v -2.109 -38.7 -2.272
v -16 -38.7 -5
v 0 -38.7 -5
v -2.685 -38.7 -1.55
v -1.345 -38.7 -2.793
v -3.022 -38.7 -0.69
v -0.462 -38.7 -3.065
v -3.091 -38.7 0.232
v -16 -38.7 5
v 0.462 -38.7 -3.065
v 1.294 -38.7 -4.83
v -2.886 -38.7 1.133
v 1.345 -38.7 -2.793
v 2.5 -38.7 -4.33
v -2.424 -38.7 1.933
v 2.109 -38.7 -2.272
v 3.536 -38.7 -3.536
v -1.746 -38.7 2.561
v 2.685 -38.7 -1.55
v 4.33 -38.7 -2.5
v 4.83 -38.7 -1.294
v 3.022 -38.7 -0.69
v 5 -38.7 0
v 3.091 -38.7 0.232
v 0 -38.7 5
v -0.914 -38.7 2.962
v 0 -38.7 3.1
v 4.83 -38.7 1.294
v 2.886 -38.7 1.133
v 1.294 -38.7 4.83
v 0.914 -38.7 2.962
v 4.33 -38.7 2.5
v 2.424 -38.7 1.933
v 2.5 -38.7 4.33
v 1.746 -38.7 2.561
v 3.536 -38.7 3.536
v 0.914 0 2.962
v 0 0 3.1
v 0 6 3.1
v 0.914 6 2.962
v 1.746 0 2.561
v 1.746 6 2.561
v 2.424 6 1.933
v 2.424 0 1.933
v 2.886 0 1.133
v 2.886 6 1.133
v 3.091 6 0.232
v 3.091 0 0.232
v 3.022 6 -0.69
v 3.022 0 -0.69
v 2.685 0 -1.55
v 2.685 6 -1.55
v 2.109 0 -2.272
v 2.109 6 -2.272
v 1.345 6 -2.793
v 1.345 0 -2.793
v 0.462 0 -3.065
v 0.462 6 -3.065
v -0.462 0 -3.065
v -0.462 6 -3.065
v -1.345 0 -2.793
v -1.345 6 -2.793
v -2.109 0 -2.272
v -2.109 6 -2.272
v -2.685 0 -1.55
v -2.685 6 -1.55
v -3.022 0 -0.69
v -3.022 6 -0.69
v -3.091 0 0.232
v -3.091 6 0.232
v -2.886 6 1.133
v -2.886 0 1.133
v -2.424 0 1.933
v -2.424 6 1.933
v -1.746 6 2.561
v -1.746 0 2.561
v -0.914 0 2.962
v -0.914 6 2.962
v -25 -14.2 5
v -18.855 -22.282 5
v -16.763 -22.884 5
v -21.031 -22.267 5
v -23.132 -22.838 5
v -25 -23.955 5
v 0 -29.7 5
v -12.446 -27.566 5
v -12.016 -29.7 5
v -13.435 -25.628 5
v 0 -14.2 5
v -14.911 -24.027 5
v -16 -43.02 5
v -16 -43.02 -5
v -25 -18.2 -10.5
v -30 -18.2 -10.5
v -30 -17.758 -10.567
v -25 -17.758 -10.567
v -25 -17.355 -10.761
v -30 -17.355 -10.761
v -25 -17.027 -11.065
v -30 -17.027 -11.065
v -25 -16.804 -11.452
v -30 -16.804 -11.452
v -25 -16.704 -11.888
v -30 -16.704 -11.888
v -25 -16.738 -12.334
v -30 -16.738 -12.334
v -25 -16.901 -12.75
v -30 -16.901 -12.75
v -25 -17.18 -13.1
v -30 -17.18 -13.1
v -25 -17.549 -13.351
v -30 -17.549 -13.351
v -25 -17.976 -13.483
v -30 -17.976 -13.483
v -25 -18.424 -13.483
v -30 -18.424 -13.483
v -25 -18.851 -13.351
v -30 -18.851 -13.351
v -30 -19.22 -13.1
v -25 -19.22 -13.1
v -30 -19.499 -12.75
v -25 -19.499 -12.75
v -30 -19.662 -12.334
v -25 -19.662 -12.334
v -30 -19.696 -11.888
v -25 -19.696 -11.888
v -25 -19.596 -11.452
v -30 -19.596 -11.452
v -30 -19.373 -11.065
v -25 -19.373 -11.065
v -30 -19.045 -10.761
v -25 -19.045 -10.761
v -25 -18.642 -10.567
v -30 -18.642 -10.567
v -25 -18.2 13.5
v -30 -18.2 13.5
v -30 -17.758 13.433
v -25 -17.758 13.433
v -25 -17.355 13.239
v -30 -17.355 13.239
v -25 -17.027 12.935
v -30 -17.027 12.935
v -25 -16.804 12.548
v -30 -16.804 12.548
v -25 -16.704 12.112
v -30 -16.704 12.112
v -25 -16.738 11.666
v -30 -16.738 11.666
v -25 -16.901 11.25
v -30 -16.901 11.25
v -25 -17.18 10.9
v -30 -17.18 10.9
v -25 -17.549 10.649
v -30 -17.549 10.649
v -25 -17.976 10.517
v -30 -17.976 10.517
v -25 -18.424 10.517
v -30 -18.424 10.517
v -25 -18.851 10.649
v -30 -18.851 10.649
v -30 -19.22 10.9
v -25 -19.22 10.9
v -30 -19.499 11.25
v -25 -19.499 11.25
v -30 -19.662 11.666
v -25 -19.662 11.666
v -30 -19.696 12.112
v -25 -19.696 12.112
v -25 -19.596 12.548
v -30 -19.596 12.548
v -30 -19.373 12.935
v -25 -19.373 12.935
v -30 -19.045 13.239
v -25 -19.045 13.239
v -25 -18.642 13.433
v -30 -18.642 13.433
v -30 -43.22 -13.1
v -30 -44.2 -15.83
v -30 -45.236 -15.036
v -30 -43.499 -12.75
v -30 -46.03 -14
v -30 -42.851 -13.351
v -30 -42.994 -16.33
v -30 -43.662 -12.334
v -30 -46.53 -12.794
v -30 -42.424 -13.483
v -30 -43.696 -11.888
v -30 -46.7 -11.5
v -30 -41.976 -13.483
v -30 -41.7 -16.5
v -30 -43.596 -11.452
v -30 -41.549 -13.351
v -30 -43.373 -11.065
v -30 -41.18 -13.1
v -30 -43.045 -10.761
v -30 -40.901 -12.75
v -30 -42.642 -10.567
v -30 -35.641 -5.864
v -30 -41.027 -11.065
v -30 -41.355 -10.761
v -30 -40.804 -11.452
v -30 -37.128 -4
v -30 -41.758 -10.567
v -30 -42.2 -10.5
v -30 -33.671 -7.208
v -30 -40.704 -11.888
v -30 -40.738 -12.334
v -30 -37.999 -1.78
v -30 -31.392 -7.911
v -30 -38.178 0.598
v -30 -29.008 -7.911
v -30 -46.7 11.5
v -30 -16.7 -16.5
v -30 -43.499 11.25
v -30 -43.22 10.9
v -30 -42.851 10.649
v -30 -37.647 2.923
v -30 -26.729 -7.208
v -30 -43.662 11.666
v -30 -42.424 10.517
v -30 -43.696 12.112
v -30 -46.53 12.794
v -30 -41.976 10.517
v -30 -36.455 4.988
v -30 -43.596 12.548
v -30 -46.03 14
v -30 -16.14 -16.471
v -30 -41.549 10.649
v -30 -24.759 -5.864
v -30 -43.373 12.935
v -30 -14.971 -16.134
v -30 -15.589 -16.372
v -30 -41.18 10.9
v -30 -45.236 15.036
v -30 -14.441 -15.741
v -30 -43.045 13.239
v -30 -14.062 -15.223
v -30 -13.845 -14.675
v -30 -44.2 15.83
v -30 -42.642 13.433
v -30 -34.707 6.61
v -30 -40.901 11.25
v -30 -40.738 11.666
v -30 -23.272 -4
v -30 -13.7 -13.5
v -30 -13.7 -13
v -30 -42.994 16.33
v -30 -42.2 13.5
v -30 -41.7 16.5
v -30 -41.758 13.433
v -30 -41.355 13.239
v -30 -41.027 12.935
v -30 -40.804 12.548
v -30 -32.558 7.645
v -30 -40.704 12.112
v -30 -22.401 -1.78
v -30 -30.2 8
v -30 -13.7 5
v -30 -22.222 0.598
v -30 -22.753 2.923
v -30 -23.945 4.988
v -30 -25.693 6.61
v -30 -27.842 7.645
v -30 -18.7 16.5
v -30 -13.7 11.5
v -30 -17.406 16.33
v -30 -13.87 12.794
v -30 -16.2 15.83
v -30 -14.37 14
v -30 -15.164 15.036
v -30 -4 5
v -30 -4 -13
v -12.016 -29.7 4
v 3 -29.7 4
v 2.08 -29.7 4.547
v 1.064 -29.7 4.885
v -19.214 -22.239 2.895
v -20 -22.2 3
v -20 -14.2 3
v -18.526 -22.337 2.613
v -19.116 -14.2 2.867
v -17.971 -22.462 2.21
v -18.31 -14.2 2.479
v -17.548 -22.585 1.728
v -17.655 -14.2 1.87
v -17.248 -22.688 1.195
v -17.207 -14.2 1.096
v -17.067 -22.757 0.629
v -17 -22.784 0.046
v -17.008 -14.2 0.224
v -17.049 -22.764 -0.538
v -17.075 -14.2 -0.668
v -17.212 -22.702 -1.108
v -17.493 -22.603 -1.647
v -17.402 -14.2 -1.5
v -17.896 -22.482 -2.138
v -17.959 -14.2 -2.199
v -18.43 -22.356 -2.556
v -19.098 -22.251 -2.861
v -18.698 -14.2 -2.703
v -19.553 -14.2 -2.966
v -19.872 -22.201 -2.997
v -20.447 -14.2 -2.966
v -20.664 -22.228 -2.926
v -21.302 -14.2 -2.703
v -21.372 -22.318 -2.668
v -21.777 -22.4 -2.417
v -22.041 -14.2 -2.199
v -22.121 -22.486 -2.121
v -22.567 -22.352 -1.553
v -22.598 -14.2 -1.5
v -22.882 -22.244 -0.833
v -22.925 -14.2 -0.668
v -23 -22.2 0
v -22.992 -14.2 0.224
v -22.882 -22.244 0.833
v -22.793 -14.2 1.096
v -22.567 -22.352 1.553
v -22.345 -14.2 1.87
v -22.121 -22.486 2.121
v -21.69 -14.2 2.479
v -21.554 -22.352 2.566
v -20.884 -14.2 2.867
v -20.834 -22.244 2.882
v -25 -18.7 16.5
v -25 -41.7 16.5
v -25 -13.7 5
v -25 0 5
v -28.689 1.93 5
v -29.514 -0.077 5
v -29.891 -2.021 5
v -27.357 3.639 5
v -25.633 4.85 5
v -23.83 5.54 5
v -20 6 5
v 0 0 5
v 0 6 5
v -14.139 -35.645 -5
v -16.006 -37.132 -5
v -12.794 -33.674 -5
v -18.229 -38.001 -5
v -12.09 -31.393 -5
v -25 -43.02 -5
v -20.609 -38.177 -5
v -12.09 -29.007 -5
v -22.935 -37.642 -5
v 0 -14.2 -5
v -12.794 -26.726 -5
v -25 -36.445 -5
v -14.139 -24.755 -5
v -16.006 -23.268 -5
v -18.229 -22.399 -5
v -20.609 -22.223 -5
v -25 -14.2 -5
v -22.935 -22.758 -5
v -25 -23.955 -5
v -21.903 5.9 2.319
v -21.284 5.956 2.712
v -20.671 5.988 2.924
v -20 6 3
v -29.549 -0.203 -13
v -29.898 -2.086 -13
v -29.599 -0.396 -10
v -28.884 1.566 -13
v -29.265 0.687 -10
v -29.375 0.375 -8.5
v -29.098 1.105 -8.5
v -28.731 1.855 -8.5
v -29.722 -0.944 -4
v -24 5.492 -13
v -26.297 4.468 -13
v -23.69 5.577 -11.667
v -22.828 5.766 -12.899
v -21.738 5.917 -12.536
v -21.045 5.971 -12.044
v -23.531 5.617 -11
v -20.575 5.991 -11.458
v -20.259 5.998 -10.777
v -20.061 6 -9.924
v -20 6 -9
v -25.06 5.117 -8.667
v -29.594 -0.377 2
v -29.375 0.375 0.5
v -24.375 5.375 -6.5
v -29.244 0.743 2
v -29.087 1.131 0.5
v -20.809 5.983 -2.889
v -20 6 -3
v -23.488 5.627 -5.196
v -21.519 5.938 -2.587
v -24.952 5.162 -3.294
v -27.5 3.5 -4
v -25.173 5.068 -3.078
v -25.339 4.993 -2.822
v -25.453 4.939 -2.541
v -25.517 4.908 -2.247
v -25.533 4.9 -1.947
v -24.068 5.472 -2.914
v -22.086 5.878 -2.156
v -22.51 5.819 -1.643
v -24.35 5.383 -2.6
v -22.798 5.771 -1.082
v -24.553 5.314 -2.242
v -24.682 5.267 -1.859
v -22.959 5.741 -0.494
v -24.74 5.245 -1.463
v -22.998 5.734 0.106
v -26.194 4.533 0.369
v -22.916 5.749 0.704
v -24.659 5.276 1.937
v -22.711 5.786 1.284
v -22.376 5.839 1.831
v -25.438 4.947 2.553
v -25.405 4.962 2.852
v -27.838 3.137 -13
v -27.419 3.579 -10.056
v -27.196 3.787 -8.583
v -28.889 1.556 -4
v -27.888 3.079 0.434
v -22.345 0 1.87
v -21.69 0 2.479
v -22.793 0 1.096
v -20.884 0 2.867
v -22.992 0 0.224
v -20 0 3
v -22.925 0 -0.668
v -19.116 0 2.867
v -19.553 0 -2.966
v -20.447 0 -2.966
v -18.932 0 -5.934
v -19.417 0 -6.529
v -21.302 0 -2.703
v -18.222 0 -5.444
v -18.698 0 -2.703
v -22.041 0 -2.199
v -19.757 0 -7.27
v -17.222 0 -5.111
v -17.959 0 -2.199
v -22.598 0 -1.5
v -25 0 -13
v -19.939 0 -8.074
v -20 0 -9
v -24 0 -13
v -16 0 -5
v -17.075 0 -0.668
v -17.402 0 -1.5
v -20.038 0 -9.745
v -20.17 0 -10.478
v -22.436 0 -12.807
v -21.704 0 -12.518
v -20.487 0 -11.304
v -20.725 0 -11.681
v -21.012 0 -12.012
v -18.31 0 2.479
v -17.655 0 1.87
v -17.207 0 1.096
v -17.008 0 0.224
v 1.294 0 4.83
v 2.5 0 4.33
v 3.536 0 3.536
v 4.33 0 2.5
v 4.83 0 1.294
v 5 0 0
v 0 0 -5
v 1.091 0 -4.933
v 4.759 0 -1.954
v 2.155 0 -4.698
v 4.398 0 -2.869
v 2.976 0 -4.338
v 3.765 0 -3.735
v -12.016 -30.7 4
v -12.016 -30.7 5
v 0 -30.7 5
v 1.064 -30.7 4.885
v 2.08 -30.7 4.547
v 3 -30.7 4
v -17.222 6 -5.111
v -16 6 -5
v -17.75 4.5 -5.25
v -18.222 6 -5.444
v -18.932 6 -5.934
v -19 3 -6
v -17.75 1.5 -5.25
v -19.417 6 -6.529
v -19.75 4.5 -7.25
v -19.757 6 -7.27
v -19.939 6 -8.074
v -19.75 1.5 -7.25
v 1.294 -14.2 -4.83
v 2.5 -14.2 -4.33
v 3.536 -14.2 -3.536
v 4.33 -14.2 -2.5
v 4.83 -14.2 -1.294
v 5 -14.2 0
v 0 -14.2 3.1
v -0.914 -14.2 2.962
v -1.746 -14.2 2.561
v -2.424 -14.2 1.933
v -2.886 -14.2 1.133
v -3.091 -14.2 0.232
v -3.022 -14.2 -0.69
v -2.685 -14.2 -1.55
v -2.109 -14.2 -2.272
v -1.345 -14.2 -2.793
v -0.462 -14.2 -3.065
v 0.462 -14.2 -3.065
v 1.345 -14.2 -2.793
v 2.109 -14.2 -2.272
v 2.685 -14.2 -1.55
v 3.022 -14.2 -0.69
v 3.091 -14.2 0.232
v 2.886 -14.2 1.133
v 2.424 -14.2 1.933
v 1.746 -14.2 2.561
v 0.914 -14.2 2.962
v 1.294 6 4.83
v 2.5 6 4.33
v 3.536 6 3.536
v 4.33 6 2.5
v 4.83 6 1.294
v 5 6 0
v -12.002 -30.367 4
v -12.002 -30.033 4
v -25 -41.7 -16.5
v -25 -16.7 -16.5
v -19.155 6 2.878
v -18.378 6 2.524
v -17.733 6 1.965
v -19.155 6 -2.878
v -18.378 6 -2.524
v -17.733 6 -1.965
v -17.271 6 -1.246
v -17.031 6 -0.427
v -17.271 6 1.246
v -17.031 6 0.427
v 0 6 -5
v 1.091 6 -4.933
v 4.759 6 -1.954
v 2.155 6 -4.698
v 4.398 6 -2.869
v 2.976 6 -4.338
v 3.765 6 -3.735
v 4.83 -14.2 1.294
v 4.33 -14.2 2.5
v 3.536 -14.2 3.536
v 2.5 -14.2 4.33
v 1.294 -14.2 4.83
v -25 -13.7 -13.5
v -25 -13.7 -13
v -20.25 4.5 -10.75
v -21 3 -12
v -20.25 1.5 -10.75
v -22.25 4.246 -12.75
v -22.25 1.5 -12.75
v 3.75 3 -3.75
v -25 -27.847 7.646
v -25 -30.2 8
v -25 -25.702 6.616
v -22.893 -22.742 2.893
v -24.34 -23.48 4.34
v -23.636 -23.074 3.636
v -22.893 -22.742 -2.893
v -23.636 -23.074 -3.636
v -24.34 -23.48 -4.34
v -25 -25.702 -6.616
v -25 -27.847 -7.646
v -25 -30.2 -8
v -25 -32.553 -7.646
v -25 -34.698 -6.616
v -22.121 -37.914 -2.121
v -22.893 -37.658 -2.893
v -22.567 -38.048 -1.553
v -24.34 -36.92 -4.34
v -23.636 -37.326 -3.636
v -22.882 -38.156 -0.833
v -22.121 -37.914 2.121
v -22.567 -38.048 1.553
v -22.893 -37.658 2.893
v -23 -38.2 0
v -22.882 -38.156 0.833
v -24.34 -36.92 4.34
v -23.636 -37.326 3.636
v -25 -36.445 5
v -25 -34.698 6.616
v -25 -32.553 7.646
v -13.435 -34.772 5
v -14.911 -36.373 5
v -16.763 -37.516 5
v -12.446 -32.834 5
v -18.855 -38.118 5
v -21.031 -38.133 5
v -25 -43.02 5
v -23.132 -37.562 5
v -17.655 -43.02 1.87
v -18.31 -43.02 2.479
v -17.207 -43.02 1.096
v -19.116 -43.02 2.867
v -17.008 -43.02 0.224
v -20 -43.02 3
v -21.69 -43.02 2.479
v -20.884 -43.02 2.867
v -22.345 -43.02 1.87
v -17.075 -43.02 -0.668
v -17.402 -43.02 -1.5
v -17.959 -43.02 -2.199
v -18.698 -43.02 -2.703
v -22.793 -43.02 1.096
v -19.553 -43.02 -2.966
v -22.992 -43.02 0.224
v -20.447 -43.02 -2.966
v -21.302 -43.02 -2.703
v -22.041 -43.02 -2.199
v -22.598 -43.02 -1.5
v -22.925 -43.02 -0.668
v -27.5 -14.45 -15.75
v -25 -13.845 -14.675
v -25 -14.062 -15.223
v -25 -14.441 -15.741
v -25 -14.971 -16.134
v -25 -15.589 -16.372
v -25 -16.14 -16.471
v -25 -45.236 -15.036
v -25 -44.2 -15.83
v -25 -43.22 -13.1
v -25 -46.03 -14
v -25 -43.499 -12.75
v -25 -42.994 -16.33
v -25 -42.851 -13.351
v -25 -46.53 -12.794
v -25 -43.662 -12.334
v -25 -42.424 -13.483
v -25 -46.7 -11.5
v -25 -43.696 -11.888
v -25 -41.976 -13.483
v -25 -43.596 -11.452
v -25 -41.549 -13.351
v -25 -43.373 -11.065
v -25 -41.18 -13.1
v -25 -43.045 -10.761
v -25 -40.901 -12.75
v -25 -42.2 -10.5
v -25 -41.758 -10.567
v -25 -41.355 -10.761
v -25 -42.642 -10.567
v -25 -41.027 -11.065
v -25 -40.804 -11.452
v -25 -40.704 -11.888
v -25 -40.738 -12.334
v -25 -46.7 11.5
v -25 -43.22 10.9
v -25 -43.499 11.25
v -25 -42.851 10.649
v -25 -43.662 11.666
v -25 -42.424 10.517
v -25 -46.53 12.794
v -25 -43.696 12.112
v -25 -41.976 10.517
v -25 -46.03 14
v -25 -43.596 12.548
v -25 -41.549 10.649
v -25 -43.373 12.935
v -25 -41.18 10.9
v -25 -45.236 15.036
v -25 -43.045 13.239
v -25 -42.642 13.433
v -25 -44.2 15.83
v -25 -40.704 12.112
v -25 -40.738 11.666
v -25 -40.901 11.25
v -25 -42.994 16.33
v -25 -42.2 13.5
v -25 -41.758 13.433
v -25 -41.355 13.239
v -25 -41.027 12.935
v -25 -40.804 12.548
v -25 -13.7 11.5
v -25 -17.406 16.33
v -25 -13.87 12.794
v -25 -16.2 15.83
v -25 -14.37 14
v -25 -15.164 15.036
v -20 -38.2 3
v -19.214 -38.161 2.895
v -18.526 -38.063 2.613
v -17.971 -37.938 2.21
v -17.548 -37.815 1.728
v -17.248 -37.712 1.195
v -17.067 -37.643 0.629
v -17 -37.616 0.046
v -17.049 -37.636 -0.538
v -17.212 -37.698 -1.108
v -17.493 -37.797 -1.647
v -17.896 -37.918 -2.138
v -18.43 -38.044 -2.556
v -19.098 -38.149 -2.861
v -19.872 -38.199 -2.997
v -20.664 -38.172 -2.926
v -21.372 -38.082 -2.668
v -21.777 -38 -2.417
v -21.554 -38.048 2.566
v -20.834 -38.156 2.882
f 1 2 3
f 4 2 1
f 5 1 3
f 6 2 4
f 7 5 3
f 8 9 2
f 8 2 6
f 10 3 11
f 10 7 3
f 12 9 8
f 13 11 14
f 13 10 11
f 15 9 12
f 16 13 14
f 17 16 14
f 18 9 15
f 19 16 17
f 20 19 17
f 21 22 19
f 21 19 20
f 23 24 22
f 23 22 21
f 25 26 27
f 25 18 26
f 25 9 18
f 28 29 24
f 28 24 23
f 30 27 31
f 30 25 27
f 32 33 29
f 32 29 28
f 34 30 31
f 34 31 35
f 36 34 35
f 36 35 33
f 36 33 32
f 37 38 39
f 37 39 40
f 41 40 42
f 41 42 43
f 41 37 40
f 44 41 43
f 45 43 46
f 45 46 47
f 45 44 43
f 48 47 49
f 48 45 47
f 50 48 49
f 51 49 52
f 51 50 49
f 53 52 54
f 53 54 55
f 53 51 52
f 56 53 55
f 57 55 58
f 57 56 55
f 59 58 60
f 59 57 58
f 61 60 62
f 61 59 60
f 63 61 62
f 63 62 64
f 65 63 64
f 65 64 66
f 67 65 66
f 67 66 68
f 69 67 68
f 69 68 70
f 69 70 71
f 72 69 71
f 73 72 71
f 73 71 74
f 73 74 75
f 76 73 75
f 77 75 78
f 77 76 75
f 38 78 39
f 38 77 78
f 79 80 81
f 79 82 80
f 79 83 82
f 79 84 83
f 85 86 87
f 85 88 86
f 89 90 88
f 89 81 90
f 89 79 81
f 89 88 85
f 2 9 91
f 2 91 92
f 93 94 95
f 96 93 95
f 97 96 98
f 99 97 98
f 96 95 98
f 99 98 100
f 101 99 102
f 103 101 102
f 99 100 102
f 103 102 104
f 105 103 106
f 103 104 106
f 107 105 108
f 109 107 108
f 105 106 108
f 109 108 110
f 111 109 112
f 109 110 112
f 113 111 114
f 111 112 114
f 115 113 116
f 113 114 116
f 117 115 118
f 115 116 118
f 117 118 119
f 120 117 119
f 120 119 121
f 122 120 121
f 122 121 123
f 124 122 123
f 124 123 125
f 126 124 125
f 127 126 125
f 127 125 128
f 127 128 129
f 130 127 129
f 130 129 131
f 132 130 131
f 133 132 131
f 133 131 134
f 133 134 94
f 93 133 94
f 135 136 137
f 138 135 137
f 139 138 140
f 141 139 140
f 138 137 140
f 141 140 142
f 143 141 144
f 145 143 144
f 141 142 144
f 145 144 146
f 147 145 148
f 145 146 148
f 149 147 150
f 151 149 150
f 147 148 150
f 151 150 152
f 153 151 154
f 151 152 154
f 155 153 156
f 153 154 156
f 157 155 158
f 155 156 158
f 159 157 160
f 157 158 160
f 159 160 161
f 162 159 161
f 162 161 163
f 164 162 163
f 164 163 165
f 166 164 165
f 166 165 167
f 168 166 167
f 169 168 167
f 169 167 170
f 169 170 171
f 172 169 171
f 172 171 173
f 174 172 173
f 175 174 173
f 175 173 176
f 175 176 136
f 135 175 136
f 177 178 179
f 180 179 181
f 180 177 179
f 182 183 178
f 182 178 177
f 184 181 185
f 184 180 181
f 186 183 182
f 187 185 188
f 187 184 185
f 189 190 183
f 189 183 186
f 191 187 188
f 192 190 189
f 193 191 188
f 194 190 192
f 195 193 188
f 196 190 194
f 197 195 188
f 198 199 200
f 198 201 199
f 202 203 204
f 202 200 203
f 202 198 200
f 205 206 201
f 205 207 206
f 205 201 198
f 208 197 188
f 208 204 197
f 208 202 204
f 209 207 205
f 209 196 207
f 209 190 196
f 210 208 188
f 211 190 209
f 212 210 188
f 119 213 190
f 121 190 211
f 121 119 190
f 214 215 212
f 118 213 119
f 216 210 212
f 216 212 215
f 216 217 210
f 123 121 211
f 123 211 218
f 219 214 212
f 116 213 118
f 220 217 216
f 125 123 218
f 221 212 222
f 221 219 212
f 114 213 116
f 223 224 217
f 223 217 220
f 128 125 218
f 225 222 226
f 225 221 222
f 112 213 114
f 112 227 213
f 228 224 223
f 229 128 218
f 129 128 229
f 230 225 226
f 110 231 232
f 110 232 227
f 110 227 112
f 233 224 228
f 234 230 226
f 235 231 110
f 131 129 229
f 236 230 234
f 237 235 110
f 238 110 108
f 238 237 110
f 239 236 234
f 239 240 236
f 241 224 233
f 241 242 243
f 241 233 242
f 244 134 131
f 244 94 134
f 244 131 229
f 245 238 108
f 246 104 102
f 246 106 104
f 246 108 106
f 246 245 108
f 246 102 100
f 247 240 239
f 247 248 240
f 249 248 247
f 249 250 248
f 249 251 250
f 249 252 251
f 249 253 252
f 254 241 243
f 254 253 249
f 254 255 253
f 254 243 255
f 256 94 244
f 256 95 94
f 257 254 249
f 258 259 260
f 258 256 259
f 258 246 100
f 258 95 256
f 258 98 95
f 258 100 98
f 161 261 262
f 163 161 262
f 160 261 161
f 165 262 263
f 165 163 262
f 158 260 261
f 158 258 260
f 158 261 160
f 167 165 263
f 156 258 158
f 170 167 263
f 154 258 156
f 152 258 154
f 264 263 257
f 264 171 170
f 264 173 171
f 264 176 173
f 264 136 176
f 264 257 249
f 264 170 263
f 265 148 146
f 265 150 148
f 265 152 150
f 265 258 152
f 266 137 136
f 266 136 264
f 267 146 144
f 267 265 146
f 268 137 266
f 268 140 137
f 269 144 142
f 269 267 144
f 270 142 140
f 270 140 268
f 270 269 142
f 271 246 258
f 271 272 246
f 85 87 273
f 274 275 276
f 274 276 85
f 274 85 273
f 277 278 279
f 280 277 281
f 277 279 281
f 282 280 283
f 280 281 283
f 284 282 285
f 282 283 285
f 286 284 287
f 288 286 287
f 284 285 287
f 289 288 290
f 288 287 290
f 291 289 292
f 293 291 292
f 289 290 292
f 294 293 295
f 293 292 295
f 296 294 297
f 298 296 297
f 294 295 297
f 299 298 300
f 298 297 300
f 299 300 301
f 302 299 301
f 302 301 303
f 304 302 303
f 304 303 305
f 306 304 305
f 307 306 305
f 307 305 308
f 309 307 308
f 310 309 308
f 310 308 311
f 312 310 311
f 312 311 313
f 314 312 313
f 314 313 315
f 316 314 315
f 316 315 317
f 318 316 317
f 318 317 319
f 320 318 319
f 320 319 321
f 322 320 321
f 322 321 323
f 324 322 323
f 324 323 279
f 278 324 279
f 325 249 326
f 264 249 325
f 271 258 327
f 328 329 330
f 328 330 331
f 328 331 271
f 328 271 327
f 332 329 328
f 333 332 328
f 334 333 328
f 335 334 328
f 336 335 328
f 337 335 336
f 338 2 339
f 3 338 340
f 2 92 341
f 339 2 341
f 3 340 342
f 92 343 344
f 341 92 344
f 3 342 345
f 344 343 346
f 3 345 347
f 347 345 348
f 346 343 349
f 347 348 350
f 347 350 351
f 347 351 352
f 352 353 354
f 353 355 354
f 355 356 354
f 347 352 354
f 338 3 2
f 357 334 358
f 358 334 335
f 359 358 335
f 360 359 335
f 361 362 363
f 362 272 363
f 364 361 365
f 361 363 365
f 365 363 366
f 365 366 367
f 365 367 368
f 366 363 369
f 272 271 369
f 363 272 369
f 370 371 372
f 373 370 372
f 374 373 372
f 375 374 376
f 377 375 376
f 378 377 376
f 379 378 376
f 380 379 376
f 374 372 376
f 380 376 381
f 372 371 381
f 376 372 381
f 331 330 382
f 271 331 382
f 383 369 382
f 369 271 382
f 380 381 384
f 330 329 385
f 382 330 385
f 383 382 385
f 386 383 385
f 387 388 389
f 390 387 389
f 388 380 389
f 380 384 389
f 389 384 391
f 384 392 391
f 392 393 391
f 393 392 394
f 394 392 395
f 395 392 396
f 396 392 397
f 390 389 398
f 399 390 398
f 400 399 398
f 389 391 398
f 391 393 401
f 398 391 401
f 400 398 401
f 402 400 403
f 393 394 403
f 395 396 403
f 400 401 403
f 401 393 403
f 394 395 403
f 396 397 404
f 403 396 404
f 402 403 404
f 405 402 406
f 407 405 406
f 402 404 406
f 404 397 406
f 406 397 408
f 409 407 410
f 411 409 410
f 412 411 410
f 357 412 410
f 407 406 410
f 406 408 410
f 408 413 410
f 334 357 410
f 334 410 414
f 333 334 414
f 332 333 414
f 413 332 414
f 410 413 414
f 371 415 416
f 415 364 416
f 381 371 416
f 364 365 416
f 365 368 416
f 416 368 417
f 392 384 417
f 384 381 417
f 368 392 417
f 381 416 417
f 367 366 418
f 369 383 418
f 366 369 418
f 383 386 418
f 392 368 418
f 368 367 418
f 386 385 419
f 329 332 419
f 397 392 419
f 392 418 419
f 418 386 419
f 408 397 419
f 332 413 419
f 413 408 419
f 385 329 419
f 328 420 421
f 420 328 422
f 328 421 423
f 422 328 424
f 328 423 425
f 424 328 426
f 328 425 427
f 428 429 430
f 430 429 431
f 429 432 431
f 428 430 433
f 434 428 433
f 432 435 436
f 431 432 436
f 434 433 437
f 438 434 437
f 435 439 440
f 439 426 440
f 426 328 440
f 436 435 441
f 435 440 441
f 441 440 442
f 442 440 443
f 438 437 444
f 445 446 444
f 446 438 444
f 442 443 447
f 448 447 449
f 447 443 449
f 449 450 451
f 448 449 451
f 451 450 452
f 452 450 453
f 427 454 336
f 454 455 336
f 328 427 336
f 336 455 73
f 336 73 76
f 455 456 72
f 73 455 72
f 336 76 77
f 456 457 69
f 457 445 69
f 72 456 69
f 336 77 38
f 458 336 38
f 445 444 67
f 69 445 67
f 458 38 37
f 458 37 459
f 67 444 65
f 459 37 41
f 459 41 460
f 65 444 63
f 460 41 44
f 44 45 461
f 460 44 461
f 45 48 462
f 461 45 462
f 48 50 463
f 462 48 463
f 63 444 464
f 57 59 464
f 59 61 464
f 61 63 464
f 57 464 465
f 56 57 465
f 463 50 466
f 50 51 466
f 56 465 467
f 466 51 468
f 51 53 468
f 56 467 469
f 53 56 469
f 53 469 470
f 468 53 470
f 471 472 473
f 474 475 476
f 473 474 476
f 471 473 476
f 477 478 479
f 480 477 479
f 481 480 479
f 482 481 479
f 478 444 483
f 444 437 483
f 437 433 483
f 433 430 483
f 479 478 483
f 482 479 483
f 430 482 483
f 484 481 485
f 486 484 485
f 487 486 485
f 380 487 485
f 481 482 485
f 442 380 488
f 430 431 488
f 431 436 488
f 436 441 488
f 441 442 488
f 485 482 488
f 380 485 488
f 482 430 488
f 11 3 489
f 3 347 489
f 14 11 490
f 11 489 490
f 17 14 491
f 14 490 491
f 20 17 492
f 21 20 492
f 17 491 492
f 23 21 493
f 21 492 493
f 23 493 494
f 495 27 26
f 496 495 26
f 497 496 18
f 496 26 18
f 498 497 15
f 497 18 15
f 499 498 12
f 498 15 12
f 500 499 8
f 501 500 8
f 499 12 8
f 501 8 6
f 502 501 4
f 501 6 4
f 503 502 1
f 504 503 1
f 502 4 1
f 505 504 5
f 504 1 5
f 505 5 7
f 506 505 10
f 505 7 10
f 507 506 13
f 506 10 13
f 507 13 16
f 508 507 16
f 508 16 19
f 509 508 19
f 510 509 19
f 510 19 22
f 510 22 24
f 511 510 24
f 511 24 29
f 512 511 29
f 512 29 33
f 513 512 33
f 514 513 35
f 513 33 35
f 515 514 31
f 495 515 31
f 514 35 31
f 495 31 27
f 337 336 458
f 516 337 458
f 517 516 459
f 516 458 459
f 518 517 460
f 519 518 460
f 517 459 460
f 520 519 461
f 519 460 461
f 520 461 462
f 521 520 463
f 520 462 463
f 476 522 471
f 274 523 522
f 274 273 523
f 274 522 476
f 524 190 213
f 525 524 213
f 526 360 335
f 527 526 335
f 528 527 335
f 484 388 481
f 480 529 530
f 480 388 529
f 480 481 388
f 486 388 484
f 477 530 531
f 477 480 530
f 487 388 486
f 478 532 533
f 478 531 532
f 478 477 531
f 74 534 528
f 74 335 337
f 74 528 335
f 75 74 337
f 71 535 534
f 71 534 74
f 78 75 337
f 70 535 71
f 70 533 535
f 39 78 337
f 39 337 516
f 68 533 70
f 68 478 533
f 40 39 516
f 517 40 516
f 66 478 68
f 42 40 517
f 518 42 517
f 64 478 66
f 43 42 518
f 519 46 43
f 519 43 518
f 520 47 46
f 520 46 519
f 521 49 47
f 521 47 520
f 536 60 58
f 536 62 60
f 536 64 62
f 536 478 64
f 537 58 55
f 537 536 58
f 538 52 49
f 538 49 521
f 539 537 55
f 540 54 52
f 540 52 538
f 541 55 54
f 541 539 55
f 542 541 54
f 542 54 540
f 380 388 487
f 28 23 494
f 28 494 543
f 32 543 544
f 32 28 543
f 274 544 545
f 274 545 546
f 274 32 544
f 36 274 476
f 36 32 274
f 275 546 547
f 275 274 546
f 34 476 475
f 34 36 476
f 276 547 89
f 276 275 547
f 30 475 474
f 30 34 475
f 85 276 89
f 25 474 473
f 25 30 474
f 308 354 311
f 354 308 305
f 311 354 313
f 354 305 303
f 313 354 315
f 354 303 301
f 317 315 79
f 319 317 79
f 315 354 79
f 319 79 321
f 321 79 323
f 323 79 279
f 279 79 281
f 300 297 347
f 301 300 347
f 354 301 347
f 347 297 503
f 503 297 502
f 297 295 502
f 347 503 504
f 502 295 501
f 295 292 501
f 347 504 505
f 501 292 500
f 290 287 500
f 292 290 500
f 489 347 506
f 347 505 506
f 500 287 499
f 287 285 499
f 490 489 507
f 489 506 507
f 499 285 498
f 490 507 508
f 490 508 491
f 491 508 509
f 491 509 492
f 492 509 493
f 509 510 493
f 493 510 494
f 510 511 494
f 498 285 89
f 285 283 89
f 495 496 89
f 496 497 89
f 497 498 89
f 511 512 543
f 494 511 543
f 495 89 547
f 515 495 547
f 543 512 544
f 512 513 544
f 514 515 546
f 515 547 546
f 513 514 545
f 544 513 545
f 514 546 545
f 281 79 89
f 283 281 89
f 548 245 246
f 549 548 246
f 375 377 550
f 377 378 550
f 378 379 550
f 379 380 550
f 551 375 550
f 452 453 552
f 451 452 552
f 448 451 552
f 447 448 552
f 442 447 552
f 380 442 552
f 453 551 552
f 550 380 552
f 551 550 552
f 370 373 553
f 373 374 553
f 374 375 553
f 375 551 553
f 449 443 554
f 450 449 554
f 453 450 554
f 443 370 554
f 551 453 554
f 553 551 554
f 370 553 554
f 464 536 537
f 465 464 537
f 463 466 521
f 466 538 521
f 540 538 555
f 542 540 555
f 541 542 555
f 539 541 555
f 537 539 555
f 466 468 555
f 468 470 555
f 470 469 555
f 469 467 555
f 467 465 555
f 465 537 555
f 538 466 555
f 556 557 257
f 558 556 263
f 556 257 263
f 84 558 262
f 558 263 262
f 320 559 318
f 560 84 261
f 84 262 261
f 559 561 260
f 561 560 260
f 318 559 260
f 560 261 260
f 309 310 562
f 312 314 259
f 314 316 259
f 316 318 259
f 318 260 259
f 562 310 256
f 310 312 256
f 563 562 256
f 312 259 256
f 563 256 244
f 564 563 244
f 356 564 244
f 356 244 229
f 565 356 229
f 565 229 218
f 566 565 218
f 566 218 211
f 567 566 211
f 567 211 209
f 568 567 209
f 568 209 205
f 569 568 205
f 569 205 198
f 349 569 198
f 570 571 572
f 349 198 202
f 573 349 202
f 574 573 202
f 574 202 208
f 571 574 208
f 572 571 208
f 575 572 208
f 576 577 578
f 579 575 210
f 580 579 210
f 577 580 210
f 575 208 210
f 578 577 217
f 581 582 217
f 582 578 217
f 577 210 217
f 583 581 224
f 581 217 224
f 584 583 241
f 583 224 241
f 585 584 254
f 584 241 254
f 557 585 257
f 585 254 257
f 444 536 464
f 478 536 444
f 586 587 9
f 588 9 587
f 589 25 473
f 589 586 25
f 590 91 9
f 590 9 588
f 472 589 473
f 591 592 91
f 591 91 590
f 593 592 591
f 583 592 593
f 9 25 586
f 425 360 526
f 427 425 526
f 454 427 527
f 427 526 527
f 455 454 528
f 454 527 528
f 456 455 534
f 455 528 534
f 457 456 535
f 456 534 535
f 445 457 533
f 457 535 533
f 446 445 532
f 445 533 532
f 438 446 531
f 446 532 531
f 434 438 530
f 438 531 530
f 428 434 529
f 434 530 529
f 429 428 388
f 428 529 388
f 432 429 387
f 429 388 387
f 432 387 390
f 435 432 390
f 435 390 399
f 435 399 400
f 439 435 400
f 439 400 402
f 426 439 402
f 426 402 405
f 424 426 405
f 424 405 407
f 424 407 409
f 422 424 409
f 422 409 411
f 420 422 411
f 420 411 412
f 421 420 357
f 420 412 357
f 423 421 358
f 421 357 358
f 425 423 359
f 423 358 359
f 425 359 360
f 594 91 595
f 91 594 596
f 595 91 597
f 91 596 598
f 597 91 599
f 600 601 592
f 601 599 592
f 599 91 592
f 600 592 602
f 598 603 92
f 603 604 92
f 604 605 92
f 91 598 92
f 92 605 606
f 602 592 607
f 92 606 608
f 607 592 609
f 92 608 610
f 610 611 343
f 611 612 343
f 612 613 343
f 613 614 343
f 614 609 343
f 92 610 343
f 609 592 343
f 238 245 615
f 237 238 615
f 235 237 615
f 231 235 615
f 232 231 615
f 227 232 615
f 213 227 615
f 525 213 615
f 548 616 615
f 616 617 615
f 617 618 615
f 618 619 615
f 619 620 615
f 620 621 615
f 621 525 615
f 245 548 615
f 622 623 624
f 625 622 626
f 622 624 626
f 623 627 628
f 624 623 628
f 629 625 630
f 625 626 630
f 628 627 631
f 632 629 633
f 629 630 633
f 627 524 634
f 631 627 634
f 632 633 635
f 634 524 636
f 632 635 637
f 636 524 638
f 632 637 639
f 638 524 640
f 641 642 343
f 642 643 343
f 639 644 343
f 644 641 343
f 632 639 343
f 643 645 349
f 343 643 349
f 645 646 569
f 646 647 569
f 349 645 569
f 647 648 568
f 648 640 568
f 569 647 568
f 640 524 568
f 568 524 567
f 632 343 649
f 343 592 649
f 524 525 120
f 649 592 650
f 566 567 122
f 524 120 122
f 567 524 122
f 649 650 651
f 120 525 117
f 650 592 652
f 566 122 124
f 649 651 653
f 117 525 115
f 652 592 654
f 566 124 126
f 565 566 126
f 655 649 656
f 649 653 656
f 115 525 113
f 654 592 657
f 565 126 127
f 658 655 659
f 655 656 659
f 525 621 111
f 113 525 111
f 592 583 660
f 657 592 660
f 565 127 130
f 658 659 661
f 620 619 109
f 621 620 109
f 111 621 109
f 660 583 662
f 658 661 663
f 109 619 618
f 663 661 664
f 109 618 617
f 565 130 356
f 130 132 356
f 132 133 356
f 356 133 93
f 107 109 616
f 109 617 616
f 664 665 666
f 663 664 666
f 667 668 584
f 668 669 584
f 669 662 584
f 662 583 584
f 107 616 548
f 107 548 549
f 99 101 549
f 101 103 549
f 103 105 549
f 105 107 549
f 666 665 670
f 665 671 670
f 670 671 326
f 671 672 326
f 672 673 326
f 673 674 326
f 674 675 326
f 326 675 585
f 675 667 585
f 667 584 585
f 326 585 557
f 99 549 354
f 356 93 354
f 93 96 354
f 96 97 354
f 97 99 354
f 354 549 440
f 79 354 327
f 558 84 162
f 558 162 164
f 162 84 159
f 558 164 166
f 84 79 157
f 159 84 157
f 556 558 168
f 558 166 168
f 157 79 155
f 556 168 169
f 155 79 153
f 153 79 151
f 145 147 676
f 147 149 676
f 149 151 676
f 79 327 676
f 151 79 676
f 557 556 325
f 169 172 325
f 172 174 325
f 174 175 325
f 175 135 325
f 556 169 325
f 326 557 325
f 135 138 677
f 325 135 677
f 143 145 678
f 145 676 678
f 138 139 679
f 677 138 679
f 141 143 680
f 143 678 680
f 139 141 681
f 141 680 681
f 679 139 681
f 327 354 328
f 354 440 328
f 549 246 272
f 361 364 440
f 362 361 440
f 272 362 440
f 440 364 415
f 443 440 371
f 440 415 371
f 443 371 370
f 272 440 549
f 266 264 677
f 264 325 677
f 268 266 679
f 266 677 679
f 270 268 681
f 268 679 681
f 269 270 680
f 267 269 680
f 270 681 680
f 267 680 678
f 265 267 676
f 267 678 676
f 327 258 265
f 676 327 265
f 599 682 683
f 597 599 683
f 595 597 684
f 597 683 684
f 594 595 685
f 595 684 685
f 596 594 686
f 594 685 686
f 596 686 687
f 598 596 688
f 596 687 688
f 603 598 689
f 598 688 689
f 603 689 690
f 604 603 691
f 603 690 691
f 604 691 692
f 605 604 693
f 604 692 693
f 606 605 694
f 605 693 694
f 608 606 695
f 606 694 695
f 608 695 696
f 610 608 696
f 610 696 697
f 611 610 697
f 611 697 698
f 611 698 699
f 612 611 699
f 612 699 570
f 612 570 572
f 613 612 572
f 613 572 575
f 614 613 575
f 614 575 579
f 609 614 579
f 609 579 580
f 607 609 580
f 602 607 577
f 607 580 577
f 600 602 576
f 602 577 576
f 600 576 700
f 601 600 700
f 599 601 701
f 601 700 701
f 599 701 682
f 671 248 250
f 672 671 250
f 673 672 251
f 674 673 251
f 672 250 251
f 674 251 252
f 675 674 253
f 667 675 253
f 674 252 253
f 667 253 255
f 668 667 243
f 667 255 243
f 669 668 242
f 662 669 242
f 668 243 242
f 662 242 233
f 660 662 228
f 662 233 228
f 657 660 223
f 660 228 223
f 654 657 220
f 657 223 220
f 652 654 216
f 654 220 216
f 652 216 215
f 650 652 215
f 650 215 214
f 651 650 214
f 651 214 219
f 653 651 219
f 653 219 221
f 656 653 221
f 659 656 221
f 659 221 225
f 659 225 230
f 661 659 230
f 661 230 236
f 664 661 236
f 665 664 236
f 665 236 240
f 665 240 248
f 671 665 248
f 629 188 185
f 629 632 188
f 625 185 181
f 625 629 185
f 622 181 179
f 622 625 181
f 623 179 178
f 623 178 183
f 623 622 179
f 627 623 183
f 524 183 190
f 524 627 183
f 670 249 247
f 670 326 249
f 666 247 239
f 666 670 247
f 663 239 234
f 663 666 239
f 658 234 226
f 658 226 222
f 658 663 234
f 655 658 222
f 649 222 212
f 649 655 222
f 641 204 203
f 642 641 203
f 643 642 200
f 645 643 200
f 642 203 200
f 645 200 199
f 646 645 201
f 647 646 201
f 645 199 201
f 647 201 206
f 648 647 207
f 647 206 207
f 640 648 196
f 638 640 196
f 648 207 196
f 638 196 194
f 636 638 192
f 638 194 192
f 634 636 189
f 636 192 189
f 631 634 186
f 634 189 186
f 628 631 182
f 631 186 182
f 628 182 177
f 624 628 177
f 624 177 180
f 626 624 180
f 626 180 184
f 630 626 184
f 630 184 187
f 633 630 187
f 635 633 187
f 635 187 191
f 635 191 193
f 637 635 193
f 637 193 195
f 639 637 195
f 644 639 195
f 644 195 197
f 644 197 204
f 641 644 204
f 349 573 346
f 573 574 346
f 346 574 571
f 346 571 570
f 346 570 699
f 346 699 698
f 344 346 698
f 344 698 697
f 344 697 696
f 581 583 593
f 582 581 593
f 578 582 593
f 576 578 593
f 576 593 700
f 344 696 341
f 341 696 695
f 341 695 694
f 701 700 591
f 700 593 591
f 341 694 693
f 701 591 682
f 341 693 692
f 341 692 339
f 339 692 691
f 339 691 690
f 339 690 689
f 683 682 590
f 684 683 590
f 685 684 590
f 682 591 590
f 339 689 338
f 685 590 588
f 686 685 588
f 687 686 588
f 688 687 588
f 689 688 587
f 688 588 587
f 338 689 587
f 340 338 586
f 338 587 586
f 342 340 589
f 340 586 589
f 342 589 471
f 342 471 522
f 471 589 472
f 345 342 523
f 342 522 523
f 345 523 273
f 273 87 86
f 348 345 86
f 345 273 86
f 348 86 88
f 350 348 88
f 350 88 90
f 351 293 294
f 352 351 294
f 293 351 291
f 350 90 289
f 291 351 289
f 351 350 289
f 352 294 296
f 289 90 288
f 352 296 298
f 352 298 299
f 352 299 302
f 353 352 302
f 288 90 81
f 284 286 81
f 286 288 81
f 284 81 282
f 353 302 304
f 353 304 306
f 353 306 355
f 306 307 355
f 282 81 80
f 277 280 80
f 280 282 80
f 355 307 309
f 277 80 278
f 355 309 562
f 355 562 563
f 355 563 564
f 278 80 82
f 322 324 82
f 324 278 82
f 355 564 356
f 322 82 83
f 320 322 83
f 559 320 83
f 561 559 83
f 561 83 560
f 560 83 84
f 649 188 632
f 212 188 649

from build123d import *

# Parameters (mm, degrees)
CROQUIS1_R              = 3
CROQUIS1_R_2            = 3.1
SALIENTE_EXTRUIR1_DEPTH = 6
CROQUIS2_W              = 10
CROQUIS2_H              = 3
SALIENTE_EXTRUIR2_DEPTH = 14.2
SALIENTE_EXTRUIR3_START = 24.5
CROQUIS3_R              = 3.1
SALIENTE_EXTRUIR3_DEPTH = 24.5
CROQUIS6_R              = 8
CORTAR_EXTRUIR1_DEPTH   = 18
REDONDEO1_R             = 5
CROQUIS7_W              = 17.859034053
CROQUIS7_H              = 1
CORTAR_EXTRUIR2_DEPTH   = 1
CROQUIS8_W              = 13
CROQUIS8_H              = 6
SALIENTE_EXTRUIR4_DEPTH = 20
CROQUIS9_W              = 5
CROQUIS9_H              = 13
SALIENTE_EXTRUIR5_DEPTH = 20.2
CROQUIS10_W             = 3
CROQUIS10_H             = 14.2
CORTAR_EXTRUIR3_DEPTH   = 20
SALIENTE_EXTRUIR6_DEPTH = 5
SALIENTE_EXTRUIR7_DEPTH = 6
REDONDEO2_R             = 4
CROQUIS13_W             = 15
CROQUIS13_H             = 24.5
CORTAR_EXTRUIR4_DEPTH   = 11
REDONDEO3_R             = 4
REDONDEO4_R             = 5
REDONDEO9_SIZE          = 10
CROQUIS15_W             = 23.51054635
CROQUIS15_H             = 8.430737454
CORTAR_EXTRUIR6_DEPTH   = 12.311914061
REDONDEO10_R            = 5
CROQUIS16_W             = 33
CROQUIS16_H             = 33
SALIENTE_EXTRUIR8_DEPTH = 5
CROQUIS18_R             = 1.5
CORTAR_EXTRUIR7_DEPTH   = 10
CROQUIS19_R             = 8
CORTAR_EXTRUIR8_DEPTH   = 10
REDONDEO13_R            = 5
REDONDEO14_R            = 5
REDONDEO15_R            = 5
REDONDEO17_SIZE         = 3
CROQUIS20_W             = 26.447439695
CROQUIS20_H             = 7.153283898
CORTAR_EXTRUIR9_DEPTH   = 8
REDONDEO18_DEPTH        = 6
REDONDEO19_SIZE         = 4
REDONDEO20_SIZE         = 5
CROQUIS21_W             = 10
CROQUIS21_H             = 4.320063387
SALIENTE_EXTRUIR9_DEPTH = 9
CROQUIS14_R             = 3
CORTAR_EXTRUIR5_DEPTH   = 59


with BuildPart() as part:
    # Croquis1 → Saliente-Extruir1 (new body)
    with BuildSketch(Plane(origin=(0, 0, 0), x_dir=(1, 0, 0), z_dir=(0, 1, 0))):
        with BuildLine():
            Line((-5, 20), (-5, 0))
            ThreePointArc((-5, 0), (0, -5), (5, 0))
            Line((5, 0), (5, 20))
            ThreePointArc((5, 20), (0, 25), (-5, 20))
        make_face()
        with Locations(Location((0, 20, 0), (0, 0, 270))):
            Circle(CROQUIS1_R, mode=Mode.SUBTRACT)
        with Locations(Location((0, 0, 0), (0, 0, 270))):
            Circle(CROQUIS1_R_2, mode=Mode.SUBTRACT)
    extrude(amount=SALIENTE_EXTRUIR1_DEPTH)

    # Croquis2 → Saliente-Extruir2 (add)
    with BuildSketch(Plane.XZ):
        with Locations((0, -14.5)):
            Rectangle(CROQUIS2_W, CROQUIS2_H)
    extrude(amount=SALIENTE_EXTRUIR2_DEPTH)

    # Croquis3 → Saliente-Extruir3 (add)
    with BuildSketch(Plane.XZ.offset(14.2).offset(SALIENTE_EXTRUIR3_START)):
        with BuildLine():
            Line((-5, -5), (-5, -16))
            Line((-5, -16), (5, -16))
            Line((5, -16), (5, 0))
            ThreePointArc((5, 0), (3.535533906, 3.535533906), (0, 5))
            Line((0, 5), (-30, 5))
            Line((-30, 5), (-30, -5))
            Line((-30, -5), (-5, -5))
        make_face()
        with Locations(Location((0, 0, 0), (0, 0, 90))):
            Circle(CROQUIS3_R, mode=Mode.SUBTRACT)
    extrude(amount=-SALIENTE_EXTRUIR3_DEPTH)

    # Croquis6 → Cortar-Extruir1 (cut)
    with BuildSketch(Plane.XY.offset(5)):
        with Locations((-20, -30.2)):
            Circle(CROQUIS6_R)
    extrude(amount=-CORTAR_EXTRUIR1_DEPTH, mode=Mode.SUBTRACT)

    # Redondeo1
    redondeo1_edges = [part.edges().sort_by_distance(p)[0] for p in [
        (-5, -26.45, -5),
    ]]
    fillet(redondeo1_edges, radius=REDONDEO1_R)

    # Croquis7 → Cortar-Extruir2 (cut)
    with BuildSketch(Plane.XY.offset(5)):
        with Locations((-3.905990917, -30.2)):
            Rectangle(CROQUIS7_W, CROQUIS7_H)
    extrude(amount=-CORTAR_EXTRUIR2_DEPTH, mode=Mode.SUBTRACT)

    # Croquis8 → Saliente-Extruir4 (add)
    with BuildSketch(Plane.ZY.offset(5)):
        with Locations((-6.5, 3)):
            Rectangle(CROQUIS8_W, CROQUIS8_H)
    extrude(amount=SALIENTE_EXTRUIR4_DEPTH)

    # Croquis9 → Saliente-Extruir5 (add)
    with BuildSketch(Plane(origin=(0, 6, 0), x_dir=(1, 0, 0), z_dir=(0, 1, 0))):
        with Locations((-27.5, 6.5)):
            Rectangle(CROQUIS9_W, CROQUIS9_H)
    extrude(amount=-SALIENTE_EXTRUIR5_DEPTH)

    # Croquis10 → Cortar-Extruir3 (cut)
    with BuildSketch(Plane.ZY.offset(5)):
        with Locations((-14.5, -7.1)):
            Rectangle(CROQUIS10_W, CROQUIS10_H)
    extrude(amount=-CORTAR_EXTRUIR3_DEPTH, mode=Mode.SUBTRACT)

    # Croquis11 → Saliente-Extruir6 (add)
    with BuildSketch(Plane.XY):
        Polygon((-5, 0), (-5, 6), (-30, 6), (-30, -14.2), (-25, -14.2), (-25, 0), align=None)
    extrude(amount=SALIENTE_EXTRUIR6_DEPTH)

    # Croquis12 → Saliente-Extruir7 (add)
    with BuildSketch(Plane(origin=(0, 6, 0), x_dir=(1, 0, 0), z_dir=(0, 1, 0))):
        Polygon((-5, -5), (0, -5), (-4.695965468, 0.35178881), (-6.407055534, -0.228241721), align=None)
    extrude(amount=-SALIENTE_EXTRUIR7_DEPTH)

    # Redondeo2
    # the kernel refuses this fillet: 4 mm, written as the material it adds along each edge
    with BuildSketch(Plane(origin=(-30, -14.2, -5), x_dir=(0, 0, -1), z_dir=(1, 0, 0))) as redondeo2_piece_1:
        with BuildLine():
            CenterArc((REDONDEO2_R, -REDONDEO2_R), REDONDEO2_R, 90, 90)
            Line((0, -REDONDEO2_R), (0, 0))
            Line((0, 0), (REDONDEO2_R, 0))
        make_face()
    extrude(amount=5)

    # Croquis13 → Cortar-Extruir4 (cut)
    with BuildSketch(Plane(origin=(0, 0, -16), x_dir=(-1, 0, 0), z_dir=(0, 0, -1))):
        with Locations((2.5, -26.45)):
            Rectangle(CROQUIS13_W, CROQUIS13_H)
    extrude(amount=-CORTAR_EXTRUIR4_DEPTH, mode=Mode.SUBTRACT)

    # Redondeo3
    redondeo3_edges = [part.edges().sort_by_distance(p)[0] for p in [
        (-5, 3, -13),
    ]]
    fillet(redondeo3_edges, radius=REDONDEO3_R)

    # Redondeo4
    redondeo4_edges = [part.edges().sort_by_distance(p)[0] for p in [
        (5, -26.45, -5),
    ]]
    fillet(redondeo4_edges, radius=REDONDEO4_R - 0.0001)  # a hair under: the kernel refuses the full size

    # Redondeo9
    # a fillet whose section is not a circle: 10 mm, written as the material it takes off along each edge
    with BuildSketch(Plane(origin=(-30, 6, 30), x_dir=(0, -1, 0), z_dir=(0, 0, -1))) as redondeo9_piece_1:
        with BuildLine():
            Bezier((REDONDEO9_SIZE, 0), (0, 0), (0, -REDONDEO9_SIZE), weights=[1, 1, 1])
            Line((0, -REDONDEO9_SIZE), (0, 0))
            Line((0, 0), (REDONDEO9_SIZE, 0))
        make_face()
    extrude(amount=68, mode=Mode.SUBTRACT)

    # Croquis15 → Cortar-Extruir6 (cut)
    with BuildSketch(Plane.XY.offset(-25.311914061)):
        with Locations((-4.843890072, 4.215368727)):
            Rectangle(CROQUIS15_W, CROQUIS15_H)
    extrude(amount=CORTAR_EXTRUIR6_DEPTH, mode=Mode.SUBTRACT)

    # Redondeo10
    redondeo10_edges = [part.edges().sort_by_distance(p)[0] for p in [
        (5, 3, -13),
    ]]
    fillet(redondeo10_edges, radius=REDONDEO10_R)

    # Croquis16 → Saliente-Extruir8 (add)
    with BuildSketch(Plane.ZY.offset(30)):
        with Locations((0, -30.2)):
            Rectangle(CROQUIS16_W, CROQUIS16_H)
    extrude(amount=-SALIENTE_EXTRUIR8_DEPTH)

    # Croquis18 → Cortar-Extruir7 (cut)
    with BuildSketch(Plane.ZY.offset(30)):
        with Locations((12, -42.2)):
            Circle(CROQUIS18_R)
        with Locations((-12, -42.2)):
            Circle(CROQUIS18_R)
        with Locations((-12, -18.2)):
            Circle(CROQUIS18_R)
        with Locations((12, -18.2)):
            Circle(CROQUIS18_R)
    extrude(amount=-CORTAR_EXTRUIR7_DEPTH, mode=Mode.SUBTRACT)

    # Croquis19 → Cortar-Extruir8 (cut)
    with BuildSketch(Plane.ZY.offset(30)):
        with Locations((0, -30.2)):
            Circle(CROQUIS19_R)
    extrude(amount=-CORTAR_EXTRUIR8_DEPTH, mode=Mode.SUBTRACT)

    # Redondeo13
    redondeo13_edges = [part.edges().sort_by_distance(p)[0] for p in [
        (-27.5, -13.7, 16.5),
    ]]
    fillet(redondeo13_edges, radius=REDONDEO13_R)

    # Redondeo14
    redondeo14_edges = [part.edges().sort_by_distance(p)[0] for p in [
        (-27.5, -46.7, 16.5),
    ]]
    fillet(redondeo14_edges, radius=REDONDEO14_R)

    # Redondeo15
    redondeo15_edges = [part.edges().sort_by_distance(p)[0] for p in [
        (-27.5, -46.7, -16.5),
    ]]
    fillet(redondeo15_edges, radius=REDONDEO15_R)

    # Redondeo17
    # a fillet whose section is not a circle: 3 mm, written as the material it takes off along each edge
    with BuildSketch(Plane(origin=(-37.5, -13.7, -16.5), x_dir=(0, -1, 0), z_dir=(1, 0, 0))) as redondeo17_piece_1:
        with BuildLine():
            Bezier((REDONDEO17_SIZE, 0), (0, 0), (0, -REDONDEO17_SIZE), weights=[1, 1, 1])
            Line((0, -REDONDEO17_SIZE), (0, 0))
            Line((0, 0), (REDONDEO17_SIZE, 0))
        make_face()
    extrude(amount=20, mode=Mode.SUBTRACT)

    # Croquis20 → Cortar-Extruir9 (cut)
    with BuildSketch(Plane(origin=(0, 0, -13), x_dir=(-1, 0, 0), z_dir=(0, 0, -1))):
        with Locations((6.776280153, 2.423358051)):
            Rectangle(CROQUIS20_W, CROQUIS20_H)
    extrude(amount=-CORTAR_EXTRUIR9_DEPTH, mode=Mode.SUBTRACT)

    # Redondeo18: read off the stored shape, not the designer's step
    # Redondeo18 outline → Redondeo18 (add)
    with BuildSketch(Plane(origin=(0, 0, 0), x_dir=(1, 0, 0), z_dir=(0, 1, 0))):
        with BuildLine():
            Line((-20, 5), (-16, 5))
            add(Edge.make_bspline(
                [(-16, 5), (-20, 5), (-20, 9)],
                knots=[0, 0, 0, 1, 1, 1], degree=2))
            Line((-20, 9), (-20, 5))
        make_face()
    extrude(amount=REDONDEO18_DEPTH)

    # Redondeo19
    # a fillet whose section is not a circle: 4 mm, written as the material it takes off along each edge
    with BuildSketch(Plane(origin=(-20, -10, -13), x_dir=(0, 0, 1), z_dir=(0, 1, 0))) as redondeo19_piece_1:
        with BuildLine():
            Bezier((REDONDEO19_SIZE, 0), (0, 0), (0, -REDONDEO19_SIZE), weights=[1, 1, 1])
            Line((0, -REDONDEO19_SIZE), (0, 0))
            Line((0, 0), (REDONDEO19_SIZE, 0))
        make_face()
    extrude(amount=26, mode=Mode.SUBTRACT)

    # Redondeo20
    # a fillet whose section is not a circle: 5 mm, written as the material it takes off along each edge
    with BuildSketch(Plane(origin=(5, 18.5, -5), x_dir=(-1, 0, 0), z_dir=(0, -1, 0))) as redondeo20_piece_1:
        with BuildLine():
            Bezier((REDONDEO20_SIZE, 0), (0, 0), (0, -REDONDEO20_SIZE), weights=[1, 1, 1])
            Line((0, -REDONDEO20_SIZE), (0, 0))
            Line((0, 0), (REDONDEO20_SIZE, 0))
        make_face()
    extrude(amount=31, mode=Mode.SUBTRACT)

    # Croquis21 → Saliente-Extruir9 (add)
    with BuildSketch(Plane(origin=(-25, 0, 0), x_dir=(0, 0, -1), z_dir=(1, 0, 0))):
        with Locations((0, -40.860031694)):
            Rectangle(CROQUIS21_W, CROQUIS21_H)
    extrude(amount=SALIENTE_EXTRUIR9_DEPTH)

    # Croquis14 → Cortar-Extruir5 (cut)
    with BuildSketch(Plane(origin=(0, 6, 0), x_dir=(1, 0, 0), z_dir=(0, 1, 0))):
        with Locations(Location((-20, 0, 0), (0, 0, 270))):
            Circle(CROQUIS14_R)
    extrude(amount=-CORTAR_EXTRUIR5_DEPTH, mode=Mode.SUBTRACT)


solid = part.part
